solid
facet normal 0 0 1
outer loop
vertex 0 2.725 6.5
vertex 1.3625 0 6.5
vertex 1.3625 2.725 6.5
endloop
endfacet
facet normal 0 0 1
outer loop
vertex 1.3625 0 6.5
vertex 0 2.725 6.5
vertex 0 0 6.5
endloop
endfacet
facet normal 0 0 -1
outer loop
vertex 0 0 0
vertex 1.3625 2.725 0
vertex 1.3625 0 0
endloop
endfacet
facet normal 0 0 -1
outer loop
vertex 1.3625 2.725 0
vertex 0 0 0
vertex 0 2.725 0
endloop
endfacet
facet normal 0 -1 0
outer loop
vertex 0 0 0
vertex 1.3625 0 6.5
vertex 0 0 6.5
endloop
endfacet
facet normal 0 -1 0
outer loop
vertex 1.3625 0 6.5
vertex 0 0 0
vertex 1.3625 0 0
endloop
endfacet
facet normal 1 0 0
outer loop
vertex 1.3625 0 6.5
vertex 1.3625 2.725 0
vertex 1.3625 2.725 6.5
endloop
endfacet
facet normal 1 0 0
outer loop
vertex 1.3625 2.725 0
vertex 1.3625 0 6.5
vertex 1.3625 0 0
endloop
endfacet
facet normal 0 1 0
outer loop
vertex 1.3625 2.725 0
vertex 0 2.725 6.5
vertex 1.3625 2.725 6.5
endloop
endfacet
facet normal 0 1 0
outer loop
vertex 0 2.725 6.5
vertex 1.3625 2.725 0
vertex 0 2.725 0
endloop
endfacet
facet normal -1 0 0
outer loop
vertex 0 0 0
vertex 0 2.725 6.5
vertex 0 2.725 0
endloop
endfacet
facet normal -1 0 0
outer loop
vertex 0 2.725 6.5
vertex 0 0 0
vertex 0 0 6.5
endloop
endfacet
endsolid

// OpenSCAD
// Generated by SolidPython 1.0.4 on 2021-01-20 11:14:16


cube(size = [1.3625000000, 2.7250000000, 6.5000000000]);
